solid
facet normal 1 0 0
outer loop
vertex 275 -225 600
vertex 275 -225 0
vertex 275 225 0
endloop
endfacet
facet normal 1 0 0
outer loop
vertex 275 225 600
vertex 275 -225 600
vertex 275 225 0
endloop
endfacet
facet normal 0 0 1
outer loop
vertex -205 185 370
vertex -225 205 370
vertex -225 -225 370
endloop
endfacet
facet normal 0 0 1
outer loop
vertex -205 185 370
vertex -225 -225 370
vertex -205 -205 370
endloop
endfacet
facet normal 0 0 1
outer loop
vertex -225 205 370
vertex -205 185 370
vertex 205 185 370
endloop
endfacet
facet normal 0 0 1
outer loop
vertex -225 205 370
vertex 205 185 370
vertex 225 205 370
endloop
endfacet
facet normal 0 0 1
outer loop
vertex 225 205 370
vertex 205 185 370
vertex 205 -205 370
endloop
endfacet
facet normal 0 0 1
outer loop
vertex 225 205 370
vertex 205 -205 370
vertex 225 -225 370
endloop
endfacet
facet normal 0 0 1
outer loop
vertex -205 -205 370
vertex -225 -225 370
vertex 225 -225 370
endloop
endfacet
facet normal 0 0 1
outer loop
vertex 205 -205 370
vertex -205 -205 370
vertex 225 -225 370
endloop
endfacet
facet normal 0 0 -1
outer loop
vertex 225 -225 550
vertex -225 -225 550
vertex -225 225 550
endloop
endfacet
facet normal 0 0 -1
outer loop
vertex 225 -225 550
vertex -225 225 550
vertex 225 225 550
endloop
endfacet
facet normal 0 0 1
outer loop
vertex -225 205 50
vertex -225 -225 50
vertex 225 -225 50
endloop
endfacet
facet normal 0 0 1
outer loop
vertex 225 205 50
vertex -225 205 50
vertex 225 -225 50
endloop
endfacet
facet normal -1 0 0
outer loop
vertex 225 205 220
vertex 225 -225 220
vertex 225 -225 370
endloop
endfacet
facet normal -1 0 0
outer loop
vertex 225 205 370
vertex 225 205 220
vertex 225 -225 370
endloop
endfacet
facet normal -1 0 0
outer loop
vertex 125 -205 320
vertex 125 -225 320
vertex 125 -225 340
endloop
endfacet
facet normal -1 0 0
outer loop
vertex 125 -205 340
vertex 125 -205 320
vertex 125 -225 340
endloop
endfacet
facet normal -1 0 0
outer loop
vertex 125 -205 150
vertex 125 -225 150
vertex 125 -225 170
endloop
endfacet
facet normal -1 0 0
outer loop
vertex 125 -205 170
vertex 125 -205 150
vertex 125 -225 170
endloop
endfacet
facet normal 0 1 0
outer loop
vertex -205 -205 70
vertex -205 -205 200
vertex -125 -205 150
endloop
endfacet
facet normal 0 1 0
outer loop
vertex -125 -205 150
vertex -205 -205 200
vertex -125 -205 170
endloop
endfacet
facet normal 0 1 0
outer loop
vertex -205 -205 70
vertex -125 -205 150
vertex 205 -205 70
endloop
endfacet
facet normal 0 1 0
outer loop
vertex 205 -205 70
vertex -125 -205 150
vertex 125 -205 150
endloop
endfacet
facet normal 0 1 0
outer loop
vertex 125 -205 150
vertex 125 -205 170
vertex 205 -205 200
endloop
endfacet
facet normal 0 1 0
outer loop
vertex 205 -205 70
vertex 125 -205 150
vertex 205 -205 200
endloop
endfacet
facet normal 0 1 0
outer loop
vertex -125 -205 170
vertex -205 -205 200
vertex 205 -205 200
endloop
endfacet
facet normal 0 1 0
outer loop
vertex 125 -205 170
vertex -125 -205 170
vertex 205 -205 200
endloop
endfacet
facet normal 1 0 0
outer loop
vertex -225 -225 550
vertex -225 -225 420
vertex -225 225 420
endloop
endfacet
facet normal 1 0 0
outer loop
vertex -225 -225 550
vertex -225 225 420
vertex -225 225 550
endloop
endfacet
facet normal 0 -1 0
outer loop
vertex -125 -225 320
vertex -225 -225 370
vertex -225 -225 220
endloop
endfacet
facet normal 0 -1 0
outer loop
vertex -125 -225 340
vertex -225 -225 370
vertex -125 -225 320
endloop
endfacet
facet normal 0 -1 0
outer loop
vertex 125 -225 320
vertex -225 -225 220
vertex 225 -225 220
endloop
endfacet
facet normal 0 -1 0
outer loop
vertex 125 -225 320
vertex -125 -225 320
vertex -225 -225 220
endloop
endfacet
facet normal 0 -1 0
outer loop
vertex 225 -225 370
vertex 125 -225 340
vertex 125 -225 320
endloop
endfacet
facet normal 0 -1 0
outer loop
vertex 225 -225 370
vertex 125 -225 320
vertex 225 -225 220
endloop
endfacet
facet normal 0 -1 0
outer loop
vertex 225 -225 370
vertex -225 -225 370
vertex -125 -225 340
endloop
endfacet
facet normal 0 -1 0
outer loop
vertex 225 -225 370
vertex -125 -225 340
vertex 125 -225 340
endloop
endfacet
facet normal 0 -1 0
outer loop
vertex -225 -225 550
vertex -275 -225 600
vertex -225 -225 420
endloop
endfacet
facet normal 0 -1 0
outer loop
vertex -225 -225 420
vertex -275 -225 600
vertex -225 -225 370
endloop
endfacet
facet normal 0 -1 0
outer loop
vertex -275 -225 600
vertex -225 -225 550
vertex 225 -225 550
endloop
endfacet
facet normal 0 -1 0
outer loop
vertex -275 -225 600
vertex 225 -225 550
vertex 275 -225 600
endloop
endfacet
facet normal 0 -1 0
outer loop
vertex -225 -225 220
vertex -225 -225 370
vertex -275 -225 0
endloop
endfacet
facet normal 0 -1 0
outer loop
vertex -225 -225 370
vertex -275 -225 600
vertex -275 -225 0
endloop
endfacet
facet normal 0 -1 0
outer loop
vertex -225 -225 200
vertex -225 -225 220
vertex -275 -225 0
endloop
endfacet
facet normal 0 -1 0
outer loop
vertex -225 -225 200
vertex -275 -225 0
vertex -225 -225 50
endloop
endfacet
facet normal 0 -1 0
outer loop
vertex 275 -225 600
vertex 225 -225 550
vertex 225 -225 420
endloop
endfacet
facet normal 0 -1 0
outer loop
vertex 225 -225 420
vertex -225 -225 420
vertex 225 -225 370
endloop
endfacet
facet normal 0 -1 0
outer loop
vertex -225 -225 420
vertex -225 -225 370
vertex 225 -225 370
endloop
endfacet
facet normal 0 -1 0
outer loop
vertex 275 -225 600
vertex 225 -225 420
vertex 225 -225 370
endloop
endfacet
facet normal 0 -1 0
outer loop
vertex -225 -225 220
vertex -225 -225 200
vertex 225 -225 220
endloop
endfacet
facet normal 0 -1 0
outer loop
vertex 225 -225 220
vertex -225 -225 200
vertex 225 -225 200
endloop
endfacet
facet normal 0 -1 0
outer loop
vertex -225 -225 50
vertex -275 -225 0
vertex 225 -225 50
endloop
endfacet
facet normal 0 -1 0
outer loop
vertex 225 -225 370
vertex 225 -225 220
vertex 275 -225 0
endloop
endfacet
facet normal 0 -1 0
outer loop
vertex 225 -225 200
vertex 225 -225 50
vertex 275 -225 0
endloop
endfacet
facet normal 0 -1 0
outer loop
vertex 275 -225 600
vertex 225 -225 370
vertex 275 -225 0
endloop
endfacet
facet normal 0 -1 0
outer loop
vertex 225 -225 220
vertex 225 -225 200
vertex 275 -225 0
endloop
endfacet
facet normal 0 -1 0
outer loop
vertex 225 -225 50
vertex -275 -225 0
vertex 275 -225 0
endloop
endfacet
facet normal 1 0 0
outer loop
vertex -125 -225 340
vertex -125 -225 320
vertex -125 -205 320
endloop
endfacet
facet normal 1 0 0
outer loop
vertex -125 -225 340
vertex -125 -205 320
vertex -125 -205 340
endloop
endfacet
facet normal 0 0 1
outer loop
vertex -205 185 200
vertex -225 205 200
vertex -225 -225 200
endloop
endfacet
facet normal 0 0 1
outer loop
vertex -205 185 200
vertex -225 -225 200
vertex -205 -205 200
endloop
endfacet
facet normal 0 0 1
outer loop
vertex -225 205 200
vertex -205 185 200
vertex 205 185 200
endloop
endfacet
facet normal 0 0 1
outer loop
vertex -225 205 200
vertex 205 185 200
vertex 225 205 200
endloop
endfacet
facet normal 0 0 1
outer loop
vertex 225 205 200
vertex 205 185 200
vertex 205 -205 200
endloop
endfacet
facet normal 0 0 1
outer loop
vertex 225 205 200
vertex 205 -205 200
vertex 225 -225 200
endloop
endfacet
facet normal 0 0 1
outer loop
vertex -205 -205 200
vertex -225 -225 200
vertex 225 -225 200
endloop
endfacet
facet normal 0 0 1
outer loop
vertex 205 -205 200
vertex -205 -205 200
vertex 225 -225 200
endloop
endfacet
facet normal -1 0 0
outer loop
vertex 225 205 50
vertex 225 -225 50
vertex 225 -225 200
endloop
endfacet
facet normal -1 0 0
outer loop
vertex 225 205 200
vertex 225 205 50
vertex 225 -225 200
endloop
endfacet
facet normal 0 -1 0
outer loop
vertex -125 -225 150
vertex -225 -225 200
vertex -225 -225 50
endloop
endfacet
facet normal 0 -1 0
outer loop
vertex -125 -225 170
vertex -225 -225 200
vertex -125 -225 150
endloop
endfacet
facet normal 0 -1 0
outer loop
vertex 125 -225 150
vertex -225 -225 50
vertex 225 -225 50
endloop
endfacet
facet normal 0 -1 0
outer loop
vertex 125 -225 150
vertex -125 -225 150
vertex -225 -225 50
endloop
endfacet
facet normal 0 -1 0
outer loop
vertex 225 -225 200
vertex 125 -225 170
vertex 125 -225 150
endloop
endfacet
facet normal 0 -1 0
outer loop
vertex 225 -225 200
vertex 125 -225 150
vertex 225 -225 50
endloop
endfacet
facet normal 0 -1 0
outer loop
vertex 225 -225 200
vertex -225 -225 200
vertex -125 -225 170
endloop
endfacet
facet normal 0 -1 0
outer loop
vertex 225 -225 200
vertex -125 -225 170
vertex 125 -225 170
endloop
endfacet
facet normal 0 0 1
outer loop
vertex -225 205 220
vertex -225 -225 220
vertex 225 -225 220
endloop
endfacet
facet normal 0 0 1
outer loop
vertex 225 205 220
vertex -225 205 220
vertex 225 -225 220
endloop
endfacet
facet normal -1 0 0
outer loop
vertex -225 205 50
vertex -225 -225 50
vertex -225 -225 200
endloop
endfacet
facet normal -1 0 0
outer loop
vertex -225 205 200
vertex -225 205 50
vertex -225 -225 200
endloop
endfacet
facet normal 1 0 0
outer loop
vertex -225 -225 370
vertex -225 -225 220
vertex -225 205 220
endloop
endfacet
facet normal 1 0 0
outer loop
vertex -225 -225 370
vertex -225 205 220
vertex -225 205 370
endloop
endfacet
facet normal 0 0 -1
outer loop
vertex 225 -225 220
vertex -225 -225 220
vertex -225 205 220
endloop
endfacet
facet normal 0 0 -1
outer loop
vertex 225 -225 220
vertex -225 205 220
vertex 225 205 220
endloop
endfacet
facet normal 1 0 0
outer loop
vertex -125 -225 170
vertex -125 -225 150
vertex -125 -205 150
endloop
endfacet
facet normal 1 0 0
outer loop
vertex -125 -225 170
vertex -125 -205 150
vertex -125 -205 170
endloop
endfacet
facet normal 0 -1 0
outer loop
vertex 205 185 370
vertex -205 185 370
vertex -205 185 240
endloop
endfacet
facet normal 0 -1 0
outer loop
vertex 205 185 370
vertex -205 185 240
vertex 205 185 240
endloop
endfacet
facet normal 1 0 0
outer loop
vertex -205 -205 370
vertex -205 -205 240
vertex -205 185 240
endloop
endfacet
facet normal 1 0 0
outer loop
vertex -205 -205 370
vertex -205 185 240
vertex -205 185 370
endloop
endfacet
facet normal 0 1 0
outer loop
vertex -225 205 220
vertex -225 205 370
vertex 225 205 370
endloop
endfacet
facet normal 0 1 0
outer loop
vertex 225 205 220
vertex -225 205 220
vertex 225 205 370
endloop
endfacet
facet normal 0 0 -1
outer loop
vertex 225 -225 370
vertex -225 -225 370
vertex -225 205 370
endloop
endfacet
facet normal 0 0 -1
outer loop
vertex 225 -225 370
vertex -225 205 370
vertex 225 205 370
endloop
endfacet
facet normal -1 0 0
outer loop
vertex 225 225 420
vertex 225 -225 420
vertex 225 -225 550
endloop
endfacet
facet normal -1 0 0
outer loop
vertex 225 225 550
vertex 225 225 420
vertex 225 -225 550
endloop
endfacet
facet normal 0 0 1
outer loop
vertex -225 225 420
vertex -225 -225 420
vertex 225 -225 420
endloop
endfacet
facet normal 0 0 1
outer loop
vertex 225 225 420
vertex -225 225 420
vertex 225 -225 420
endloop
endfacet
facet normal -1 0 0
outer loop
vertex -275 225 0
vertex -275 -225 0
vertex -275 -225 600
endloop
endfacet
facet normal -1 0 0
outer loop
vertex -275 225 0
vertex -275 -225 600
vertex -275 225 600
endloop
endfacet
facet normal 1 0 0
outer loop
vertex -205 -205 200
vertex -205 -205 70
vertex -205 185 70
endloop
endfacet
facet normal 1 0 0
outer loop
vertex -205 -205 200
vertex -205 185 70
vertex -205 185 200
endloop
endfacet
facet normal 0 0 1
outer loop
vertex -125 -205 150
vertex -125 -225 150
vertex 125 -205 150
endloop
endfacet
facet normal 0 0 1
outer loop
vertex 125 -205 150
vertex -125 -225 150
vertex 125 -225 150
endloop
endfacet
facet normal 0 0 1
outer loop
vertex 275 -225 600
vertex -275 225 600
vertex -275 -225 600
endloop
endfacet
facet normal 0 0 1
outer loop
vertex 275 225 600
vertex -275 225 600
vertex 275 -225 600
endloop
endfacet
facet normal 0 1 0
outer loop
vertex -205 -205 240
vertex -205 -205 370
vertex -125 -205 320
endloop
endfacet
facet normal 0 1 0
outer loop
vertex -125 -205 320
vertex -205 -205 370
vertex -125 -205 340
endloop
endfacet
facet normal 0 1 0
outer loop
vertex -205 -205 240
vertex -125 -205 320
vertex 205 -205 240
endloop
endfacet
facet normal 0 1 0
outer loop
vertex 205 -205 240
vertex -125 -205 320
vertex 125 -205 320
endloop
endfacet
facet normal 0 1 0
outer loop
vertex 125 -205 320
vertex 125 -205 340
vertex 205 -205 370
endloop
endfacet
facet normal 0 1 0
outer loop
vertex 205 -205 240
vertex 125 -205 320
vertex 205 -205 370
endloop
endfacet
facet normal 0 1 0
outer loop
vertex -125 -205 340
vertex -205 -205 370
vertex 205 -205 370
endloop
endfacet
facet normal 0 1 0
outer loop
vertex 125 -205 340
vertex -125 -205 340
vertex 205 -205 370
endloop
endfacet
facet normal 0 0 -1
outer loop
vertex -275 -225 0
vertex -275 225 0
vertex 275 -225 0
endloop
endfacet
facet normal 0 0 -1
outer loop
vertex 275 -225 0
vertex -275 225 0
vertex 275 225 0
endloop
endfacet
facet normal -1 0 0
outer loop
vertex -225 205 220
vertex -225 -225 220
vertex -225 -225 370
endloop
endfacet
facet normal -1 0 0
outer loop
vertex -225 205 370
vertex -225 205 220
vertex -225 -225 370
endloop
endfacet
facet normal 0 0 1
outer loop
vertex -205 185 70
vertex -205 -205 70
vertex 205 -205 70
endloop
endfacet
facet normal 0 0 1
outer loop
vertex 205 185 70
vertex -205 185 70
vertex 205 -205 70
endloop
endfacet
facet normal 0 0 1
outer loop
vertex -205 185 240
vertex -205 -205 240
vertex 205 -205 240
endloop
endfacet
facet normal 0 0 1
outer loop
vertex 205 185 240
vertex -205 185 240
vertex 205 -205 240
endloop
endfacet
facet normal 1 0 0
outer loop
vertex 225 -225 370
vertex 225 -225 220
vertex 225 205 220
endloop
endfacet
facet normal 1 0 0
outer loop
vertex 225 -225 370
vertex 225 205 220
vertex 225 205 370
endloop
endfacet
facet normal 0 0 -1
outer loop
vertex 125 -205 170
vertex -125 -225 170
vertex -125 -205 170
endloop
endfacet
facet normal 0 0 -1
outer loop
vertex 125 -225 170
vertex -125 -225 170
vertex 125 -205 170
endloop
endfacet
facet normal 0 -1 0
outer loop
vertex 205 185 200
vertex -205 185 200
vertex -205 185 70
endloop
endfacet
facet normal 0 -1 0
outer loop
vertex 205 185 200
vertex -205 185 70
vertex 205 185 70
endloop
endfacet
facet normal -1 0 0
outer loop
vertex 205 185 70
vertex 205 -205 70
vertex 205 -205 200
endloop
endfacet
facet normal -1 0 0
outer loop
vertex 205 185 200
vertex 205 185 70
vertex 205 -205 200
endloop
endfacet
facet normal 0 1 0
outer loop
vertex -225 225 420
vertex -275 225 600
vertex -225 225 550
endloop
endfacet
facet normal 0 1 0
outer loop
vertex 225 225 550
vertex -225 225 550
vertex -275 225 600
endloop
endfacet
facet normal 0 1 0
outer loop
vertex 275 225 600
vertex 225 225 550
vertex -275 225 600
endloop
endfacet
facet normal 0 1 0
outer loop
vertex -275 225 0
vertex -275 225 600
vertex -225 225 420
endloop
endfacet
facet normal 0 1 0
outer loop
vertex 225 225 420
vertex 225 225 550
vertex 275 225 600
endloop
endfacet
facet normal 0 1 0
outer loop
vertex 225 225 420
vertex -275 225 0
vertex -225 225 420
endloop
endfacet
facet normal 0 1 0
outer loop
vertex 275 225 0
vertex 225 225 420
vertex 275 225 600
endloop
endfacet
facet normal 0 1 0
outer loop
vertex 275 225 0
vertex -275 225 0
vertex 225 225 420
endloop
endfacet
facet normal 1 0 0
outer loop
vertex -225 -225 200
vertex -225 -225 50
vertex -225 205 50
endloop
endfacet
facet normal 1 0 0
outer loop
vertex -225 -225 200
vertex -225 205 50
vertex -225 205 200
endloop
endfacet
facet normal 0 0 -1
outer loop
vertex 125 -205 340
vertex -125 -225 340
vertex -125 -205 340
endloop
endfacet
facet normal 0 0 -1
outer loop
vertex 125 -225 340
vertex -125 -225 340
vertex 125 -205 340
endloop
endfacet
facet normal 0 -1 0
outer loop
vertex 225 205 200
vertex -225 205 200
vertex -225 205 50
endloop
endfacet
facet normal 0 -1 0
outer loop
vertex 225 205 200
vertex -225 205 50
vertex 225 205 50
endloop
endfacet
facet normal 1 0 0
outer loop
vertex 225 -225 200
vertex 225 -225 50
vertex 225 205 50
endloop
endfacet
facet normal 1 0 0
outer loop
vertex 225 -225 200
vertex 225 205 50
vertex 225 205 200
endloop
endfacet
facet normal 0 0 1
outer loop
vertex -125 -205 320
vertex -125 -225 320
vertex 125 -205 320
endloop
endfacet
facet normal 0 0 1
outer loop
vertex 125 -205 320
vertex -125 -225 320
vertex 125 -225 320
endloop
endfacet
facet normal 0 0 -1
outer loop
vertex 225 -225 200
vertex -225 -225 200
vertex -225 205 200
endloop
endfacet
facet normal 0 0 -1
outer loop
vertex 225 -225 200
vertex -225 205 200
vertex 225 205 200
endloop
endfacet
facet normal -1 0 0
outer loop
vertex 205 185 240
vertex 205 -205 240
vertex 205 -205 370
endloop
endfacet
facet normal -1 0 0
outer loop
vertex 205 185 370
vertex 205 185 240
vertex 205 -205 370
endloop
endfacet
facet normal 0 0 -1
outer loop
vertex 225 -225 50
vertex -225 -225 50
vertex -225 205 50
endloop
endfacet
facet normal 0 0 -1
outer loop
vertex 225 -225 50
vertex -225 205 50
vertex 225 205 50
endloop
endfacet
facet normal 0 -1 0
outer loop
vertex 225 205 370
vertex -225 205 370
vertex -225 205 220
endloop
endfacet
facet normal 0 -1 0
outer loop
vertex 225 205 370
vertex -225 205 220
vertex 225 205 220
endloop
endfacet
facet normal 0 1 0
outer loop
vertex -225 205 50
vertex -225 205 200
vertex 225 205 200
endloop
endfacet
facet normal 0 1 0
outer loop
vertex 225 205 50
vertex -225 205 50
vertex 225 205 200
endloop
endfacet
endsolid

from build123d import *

# Parameters (mm, degrees)
F0_W     = 550
F0_H     = 450
F1_DEPTH = 600
F2_W     = 450
F2_H     = 150
F2_H_2   = 130
F3_DEPTH = 430
F4_DEPTH = 20.001
F5_DEPTH = 430
F6_T     = -20
F6_2_T   = -20
F7_W     = 250
F7_H     = 20
F8_DEPTH = 20


with BuildPart() as f1:
    # F0 (on Top) → F1 (new body)
    with BuildSketch(Plane.XY):
        Rectangle(F0_W, F0_H)
    extrude(amount=F1_DEPTH)

    # F2 (on face) → F3 (cut)
    with BuildSketch(Plane.XZ.offset(225)):
        with Locations((0, 125)):
            Rectangle(F2_W, F2_H)
        with Locations((0, 295)):
            Rectangle(F2_W, F2_H)
        with Locations((0, 485)):
            Rectangle(F2_W, F2_H_2)
    extrude(amount=-F3_DEPTH, mode=Mode.SUBTRACT)

    # F4 (cut, through all): a face of the model
    f4_faces = [f1.faces().sort_by_distance(p)[0] for p in [
        (0, 205, 485),
    ]]
    extrude(f4_faces, amount=-F4_DEPTH, mode=Mode.SUBTRACT)


with BuildPart() as f5:
    # F2 (on face) → F5 (new body, through all)
    with BuildSketch(Plane.XZ.offset(225)):
        with Locations((0, 125)):
            Rectangle(F2_W, F2_H)
    extrude(amount=-F5_DEPTH)

    # F6#2
    f6_2_openings = [f5.faces().sort_by_distance(p)[0] for p in [
        (0, -10, 200),
    ]]
    offset(amount=F6_2_T, openings=f6_2_openings)


with BuildPart() as f5b:
    # F2 (on face) → F5, piece 2 (new body, through all)
    with BuildSketch(Plane.XZ.offset(225)):
        with Locations((0, 295)):
            Rectangle(F2_W, F2_H)
    extrude(amount=-F5_DEPTH)

    # F6
    f6_openings = [f5b.faces().sort_by_distance(p)[0] for p in [
        (0, -10, 370),
    ]]
    offset(amount=F6_T, openings=f6_openings)


with BuildPart() as f8_tool:
    # F7 (on face) → F8 (new body, through all)
    with BuildSketch(Plane.XZ.offset(225)):
        with Locations((0, 330)):
            Rectangle(F7_W, F7_H)
        with Locations((0, 160)):
            Rectangle(F7_W, F7_H)
    extrude(amount=-F8_DEPTH)


with BuildPart() as f5_1:
    add(f5.part)

    # F8: cut by f8_tool
    add(f8_tool.part, mode=Mode.SUBTRACT)


with BuildPart() as f5b_1:
    add(f5b.part)

    # F8: cut by f8_tool
    add(f8_tool.part, mode=Mode.SUBTRACT)


solid = Compound([f1.part, f5_1.part, f5b_1.part])
